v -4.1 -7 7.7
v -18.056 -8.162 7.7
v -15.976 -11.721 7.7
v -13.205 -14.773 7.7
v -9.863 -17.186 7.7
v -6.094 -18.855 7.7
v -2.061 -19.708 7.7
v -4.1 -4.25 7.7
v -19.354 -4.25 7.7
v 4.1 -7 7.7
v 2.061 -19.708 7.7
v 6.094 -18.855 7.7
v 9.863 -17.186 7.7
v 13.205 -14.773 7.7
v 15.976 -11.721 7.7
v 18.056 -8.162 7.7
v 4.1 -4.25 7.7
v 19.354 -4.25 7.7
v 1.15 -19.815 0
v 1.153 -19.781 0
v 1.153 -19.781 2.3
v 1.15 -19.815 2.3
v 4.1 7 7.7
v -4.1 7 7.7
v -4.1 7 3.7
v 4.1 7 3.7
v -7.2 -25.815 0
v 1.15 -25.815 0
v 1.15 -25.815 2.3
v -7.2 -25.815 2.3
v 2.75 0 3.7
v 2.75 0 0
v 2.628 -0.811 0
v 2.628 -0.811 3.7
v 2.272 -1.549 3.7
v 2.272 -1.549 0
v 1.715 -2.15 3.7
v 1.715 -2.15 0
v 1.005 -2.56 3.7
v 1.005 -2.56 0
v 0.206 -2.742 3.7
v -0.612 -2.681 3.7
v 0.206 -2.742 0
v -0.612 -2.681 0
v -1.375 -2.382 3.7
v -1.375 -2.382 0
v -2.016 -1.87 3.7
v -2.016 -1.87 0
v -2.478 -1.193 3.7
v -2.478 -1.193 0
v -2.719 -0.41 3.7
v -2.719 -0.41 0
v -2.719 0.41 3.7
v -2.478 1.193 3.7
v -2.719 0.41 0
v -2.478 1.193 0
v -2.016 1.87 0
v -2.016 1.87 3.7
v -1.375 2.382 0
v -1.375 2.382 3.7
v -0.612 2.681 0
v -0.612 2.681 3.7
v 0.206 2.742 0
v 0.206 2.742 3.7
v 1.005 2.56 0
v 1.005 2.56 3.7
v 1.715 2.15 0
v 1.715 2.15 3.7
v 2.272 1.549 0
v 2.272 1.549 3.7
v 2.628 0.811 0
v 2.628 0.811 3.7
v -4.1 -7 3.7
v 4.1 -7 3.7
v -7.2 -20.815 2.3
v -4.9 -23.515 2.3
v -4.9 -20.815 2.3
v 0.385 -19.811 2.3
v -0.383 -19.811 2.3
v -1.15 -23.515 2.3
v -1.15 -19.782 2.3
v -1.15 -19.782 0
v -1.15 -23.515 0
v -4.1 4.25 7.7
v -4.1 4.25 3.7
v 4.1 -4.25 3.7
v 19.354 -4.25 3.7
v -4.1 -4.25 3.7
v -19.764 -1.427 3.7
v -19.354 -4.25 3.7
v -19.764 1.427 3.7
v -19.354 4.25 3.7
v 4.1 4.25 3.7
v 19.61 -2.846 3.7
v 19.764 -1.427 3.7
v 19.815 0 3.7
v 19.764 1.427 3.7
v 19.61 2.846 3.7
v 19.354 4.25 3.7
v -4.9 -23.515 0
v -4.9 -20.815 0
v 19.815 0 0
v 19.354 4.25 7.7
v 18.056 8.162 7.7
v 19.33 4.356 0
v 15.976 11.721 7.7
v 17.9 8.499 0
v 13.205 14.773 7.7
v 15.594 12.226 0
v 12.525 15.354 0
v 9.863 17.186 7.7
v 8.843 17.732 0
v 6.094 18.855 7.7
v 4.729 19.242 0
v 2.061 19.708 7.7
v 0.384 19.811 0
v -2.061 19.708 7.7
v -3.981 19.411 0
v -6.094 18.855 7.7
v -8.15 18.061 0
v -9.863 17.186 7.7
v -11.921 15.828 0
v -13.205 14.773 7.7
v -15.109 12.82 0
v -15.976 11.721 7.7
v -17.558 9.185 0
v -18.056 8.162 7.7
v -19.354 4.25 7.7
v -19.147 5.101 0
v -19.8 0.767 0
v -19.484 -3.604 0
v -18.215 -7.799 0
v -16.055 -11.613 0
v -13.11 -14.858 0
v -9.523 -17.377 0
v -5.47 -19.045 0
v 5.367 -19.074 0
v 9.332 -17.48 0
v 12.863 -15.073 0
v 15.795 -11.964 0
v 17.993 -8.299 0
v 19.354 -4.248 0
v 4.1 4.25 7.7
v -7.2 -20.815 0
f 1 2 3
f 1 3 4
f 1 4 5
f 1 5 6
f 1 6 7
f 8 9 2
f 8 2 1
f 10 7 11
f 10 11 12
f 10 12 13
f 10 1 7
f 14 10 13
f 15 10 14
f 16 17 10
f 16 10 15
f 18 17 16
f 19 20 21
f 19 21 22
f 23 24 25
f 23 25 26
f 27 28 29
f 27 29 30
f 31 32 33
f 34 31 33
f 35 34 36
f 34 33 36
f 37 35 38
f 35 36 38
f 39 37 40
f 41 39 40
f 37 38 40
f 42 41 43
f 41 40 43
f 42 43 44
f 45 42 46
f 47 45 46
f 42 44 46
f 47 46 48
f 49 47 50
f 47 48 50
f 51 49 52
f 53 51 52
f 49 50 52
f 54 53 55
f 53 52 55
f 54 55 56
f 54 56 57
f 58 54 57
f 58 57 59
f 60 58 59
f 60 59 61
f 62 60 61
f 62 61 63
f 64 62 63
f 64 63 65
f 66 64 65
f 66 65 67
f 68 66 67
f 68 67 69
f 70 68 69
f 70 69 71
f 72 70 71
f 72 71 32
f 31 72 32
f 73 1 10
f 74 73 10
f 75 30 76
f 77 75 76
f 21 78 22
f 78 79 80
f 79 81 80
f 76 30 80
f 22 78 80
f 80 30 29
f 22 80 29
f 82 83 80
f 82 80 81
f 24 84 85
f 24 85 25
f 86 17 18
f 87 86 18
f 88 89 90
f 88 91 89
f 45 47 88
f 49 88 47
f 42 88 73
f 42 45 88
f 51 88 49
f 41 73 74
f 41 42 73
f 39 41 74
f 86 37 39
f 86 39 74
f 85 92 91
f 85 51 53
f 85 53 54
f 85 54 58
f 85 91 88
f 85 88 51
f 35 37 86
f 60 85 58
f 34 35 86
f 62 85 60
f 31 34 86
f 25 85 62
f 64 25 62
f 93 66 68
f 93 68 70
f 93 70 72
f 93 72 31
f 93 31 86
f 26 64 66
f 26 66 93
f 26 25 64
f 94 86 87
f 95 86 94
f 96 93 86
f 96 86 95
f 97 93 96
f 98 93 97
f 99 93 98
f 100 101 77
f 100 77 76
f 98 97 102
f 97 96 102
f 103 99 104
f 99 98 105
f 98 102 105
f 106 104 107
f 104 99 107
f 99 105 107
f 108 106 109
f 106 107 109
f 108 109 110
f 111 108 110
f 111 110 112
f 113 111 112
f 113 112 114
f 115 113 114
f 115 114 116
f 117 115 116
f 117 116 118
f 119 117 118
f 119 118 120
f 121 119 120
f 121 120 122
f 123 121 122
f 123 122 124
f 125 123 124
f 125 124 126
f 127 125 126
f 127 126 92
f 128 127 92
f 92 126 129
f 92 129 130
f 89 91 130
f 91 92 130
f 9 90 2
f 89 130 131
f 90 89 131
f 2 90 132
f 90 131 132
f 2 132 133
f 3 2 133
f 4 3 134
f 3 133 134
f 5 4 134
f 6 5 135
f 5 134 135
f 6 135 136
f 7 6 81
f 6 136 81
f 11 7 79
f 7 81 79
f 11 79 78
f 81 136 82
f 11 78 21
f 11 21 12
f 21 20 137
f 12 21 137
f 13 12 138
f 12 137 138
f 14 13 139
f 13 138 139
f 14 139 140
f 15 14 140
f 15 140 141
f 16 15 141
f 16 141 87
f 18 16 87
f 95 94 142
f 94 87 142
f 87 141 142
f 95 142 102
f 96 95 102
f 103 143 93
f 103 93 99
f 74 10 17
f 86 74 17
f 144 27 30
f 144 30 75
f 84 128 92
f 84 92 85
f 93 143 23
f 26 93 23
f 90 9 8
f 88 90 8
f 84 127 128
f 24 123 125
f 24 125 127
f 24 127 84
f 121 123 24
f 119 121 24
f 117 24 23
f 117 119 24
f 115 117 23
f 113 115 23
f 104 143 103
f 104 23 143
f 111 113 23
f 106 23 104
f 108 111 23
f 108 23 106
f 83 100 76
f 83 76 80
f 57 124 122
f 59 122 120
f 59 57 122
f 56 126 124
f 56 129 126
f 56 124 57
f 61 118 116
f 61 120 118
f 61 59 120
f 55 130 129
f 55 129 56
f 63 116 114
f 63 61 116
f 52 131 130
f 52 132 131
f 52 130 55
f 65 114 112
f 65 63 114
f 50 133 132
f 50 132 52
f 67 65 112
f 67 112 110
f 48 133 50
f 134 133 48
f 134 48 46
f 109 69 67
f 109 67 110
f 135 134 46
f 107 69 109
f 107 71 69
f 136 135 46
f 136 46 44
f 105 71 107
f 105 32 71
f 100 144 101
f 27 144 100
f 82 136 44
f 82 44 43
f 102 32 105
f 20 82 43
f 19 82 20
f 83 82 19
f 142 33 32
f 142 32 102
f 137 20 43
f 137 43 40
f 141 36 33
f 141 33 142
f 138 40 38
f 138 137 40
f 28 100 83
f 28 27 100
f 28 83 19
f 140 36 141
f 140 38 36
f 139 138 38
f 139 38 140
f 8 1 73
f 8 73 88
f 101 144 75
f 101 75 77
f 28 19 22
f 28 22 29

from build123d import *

# Parameters (mm, degrees)
F0_R     = 19.815
F1_DEPTH = 7.7
F2_W     = 8.2
F2_H     = 14
F3_DEPTH = 4
F4_W     = 40.63
F4_H     = 8.5
F5_DEPTH = 4
F6_W     = 2.3
F6_H     = 2.3
F6_W_2   = 3.75
F6_H_2   = 2.7
F7_DEPTH = 2.3
F8_R     = 2.75
F9_DEPTH = 25


with BuildPart() as f1:
    # F0 (on Top) → F1 (new body)
    with BuildSketch(Plane.XY):
        Circle(F0_R)
    extrude(amount=F1_DEPTH)

    # F2 (on face) → F3 (cut)
    with BuildSketch(Plane.XY.offset(7.7)):
        Rectangle(F2_W, F2_H)
    extrude(amount=-F3_DEPTH, mode=Mode.SUBTRACT)

    # F4 (on face) → F5 (cut)
    with BuildSketch(Plane.XY.offset(7.7)):
        Rectangle(F4_W, F4_H)
    extrude(amount=-F5_DEPTH, mode=Mode.SUBTRACT)

    # F6 (on face) → F7 (join)
    with BuildSketch(Plane(origin=(0, 0, 0), x_dir=(1, 0, 0), z_dir=(0, 0, -1))):
        with Locations((0, 24.665)):
            Rectangle(F6_W, F6_H)
        with Locations((-3.025, 24.665)):
            Rectangle(F6_W_2, F6_H)
        Polygon((1.15, 19.815), (1.15, 23.515), (-1.15, 23.515), (-1.15, 19.815), (-1.15, 19.516828), (1.172135, 19.553192), align=None)
        with Locations((-6.05, 24.665)):
            Rectangle(F6_W, F6_H)
        with Locations((-6.05, 22.165)):
            Rectangle(F6_W, F6_H_2)
    extrude(amount=-F7_DEPTH)

    # F8 (on face) → F9 (cut)
    with BuildSketch(Plane(origin=(0, 0, 0), x_dir=(1, 0, 0), z_dir=(0, 0, -1))):
        Circle(F8_R)
    extrude(amount=-F9_DEPTH, mode=Mode.SUBTRACT)


solid = f1.part
